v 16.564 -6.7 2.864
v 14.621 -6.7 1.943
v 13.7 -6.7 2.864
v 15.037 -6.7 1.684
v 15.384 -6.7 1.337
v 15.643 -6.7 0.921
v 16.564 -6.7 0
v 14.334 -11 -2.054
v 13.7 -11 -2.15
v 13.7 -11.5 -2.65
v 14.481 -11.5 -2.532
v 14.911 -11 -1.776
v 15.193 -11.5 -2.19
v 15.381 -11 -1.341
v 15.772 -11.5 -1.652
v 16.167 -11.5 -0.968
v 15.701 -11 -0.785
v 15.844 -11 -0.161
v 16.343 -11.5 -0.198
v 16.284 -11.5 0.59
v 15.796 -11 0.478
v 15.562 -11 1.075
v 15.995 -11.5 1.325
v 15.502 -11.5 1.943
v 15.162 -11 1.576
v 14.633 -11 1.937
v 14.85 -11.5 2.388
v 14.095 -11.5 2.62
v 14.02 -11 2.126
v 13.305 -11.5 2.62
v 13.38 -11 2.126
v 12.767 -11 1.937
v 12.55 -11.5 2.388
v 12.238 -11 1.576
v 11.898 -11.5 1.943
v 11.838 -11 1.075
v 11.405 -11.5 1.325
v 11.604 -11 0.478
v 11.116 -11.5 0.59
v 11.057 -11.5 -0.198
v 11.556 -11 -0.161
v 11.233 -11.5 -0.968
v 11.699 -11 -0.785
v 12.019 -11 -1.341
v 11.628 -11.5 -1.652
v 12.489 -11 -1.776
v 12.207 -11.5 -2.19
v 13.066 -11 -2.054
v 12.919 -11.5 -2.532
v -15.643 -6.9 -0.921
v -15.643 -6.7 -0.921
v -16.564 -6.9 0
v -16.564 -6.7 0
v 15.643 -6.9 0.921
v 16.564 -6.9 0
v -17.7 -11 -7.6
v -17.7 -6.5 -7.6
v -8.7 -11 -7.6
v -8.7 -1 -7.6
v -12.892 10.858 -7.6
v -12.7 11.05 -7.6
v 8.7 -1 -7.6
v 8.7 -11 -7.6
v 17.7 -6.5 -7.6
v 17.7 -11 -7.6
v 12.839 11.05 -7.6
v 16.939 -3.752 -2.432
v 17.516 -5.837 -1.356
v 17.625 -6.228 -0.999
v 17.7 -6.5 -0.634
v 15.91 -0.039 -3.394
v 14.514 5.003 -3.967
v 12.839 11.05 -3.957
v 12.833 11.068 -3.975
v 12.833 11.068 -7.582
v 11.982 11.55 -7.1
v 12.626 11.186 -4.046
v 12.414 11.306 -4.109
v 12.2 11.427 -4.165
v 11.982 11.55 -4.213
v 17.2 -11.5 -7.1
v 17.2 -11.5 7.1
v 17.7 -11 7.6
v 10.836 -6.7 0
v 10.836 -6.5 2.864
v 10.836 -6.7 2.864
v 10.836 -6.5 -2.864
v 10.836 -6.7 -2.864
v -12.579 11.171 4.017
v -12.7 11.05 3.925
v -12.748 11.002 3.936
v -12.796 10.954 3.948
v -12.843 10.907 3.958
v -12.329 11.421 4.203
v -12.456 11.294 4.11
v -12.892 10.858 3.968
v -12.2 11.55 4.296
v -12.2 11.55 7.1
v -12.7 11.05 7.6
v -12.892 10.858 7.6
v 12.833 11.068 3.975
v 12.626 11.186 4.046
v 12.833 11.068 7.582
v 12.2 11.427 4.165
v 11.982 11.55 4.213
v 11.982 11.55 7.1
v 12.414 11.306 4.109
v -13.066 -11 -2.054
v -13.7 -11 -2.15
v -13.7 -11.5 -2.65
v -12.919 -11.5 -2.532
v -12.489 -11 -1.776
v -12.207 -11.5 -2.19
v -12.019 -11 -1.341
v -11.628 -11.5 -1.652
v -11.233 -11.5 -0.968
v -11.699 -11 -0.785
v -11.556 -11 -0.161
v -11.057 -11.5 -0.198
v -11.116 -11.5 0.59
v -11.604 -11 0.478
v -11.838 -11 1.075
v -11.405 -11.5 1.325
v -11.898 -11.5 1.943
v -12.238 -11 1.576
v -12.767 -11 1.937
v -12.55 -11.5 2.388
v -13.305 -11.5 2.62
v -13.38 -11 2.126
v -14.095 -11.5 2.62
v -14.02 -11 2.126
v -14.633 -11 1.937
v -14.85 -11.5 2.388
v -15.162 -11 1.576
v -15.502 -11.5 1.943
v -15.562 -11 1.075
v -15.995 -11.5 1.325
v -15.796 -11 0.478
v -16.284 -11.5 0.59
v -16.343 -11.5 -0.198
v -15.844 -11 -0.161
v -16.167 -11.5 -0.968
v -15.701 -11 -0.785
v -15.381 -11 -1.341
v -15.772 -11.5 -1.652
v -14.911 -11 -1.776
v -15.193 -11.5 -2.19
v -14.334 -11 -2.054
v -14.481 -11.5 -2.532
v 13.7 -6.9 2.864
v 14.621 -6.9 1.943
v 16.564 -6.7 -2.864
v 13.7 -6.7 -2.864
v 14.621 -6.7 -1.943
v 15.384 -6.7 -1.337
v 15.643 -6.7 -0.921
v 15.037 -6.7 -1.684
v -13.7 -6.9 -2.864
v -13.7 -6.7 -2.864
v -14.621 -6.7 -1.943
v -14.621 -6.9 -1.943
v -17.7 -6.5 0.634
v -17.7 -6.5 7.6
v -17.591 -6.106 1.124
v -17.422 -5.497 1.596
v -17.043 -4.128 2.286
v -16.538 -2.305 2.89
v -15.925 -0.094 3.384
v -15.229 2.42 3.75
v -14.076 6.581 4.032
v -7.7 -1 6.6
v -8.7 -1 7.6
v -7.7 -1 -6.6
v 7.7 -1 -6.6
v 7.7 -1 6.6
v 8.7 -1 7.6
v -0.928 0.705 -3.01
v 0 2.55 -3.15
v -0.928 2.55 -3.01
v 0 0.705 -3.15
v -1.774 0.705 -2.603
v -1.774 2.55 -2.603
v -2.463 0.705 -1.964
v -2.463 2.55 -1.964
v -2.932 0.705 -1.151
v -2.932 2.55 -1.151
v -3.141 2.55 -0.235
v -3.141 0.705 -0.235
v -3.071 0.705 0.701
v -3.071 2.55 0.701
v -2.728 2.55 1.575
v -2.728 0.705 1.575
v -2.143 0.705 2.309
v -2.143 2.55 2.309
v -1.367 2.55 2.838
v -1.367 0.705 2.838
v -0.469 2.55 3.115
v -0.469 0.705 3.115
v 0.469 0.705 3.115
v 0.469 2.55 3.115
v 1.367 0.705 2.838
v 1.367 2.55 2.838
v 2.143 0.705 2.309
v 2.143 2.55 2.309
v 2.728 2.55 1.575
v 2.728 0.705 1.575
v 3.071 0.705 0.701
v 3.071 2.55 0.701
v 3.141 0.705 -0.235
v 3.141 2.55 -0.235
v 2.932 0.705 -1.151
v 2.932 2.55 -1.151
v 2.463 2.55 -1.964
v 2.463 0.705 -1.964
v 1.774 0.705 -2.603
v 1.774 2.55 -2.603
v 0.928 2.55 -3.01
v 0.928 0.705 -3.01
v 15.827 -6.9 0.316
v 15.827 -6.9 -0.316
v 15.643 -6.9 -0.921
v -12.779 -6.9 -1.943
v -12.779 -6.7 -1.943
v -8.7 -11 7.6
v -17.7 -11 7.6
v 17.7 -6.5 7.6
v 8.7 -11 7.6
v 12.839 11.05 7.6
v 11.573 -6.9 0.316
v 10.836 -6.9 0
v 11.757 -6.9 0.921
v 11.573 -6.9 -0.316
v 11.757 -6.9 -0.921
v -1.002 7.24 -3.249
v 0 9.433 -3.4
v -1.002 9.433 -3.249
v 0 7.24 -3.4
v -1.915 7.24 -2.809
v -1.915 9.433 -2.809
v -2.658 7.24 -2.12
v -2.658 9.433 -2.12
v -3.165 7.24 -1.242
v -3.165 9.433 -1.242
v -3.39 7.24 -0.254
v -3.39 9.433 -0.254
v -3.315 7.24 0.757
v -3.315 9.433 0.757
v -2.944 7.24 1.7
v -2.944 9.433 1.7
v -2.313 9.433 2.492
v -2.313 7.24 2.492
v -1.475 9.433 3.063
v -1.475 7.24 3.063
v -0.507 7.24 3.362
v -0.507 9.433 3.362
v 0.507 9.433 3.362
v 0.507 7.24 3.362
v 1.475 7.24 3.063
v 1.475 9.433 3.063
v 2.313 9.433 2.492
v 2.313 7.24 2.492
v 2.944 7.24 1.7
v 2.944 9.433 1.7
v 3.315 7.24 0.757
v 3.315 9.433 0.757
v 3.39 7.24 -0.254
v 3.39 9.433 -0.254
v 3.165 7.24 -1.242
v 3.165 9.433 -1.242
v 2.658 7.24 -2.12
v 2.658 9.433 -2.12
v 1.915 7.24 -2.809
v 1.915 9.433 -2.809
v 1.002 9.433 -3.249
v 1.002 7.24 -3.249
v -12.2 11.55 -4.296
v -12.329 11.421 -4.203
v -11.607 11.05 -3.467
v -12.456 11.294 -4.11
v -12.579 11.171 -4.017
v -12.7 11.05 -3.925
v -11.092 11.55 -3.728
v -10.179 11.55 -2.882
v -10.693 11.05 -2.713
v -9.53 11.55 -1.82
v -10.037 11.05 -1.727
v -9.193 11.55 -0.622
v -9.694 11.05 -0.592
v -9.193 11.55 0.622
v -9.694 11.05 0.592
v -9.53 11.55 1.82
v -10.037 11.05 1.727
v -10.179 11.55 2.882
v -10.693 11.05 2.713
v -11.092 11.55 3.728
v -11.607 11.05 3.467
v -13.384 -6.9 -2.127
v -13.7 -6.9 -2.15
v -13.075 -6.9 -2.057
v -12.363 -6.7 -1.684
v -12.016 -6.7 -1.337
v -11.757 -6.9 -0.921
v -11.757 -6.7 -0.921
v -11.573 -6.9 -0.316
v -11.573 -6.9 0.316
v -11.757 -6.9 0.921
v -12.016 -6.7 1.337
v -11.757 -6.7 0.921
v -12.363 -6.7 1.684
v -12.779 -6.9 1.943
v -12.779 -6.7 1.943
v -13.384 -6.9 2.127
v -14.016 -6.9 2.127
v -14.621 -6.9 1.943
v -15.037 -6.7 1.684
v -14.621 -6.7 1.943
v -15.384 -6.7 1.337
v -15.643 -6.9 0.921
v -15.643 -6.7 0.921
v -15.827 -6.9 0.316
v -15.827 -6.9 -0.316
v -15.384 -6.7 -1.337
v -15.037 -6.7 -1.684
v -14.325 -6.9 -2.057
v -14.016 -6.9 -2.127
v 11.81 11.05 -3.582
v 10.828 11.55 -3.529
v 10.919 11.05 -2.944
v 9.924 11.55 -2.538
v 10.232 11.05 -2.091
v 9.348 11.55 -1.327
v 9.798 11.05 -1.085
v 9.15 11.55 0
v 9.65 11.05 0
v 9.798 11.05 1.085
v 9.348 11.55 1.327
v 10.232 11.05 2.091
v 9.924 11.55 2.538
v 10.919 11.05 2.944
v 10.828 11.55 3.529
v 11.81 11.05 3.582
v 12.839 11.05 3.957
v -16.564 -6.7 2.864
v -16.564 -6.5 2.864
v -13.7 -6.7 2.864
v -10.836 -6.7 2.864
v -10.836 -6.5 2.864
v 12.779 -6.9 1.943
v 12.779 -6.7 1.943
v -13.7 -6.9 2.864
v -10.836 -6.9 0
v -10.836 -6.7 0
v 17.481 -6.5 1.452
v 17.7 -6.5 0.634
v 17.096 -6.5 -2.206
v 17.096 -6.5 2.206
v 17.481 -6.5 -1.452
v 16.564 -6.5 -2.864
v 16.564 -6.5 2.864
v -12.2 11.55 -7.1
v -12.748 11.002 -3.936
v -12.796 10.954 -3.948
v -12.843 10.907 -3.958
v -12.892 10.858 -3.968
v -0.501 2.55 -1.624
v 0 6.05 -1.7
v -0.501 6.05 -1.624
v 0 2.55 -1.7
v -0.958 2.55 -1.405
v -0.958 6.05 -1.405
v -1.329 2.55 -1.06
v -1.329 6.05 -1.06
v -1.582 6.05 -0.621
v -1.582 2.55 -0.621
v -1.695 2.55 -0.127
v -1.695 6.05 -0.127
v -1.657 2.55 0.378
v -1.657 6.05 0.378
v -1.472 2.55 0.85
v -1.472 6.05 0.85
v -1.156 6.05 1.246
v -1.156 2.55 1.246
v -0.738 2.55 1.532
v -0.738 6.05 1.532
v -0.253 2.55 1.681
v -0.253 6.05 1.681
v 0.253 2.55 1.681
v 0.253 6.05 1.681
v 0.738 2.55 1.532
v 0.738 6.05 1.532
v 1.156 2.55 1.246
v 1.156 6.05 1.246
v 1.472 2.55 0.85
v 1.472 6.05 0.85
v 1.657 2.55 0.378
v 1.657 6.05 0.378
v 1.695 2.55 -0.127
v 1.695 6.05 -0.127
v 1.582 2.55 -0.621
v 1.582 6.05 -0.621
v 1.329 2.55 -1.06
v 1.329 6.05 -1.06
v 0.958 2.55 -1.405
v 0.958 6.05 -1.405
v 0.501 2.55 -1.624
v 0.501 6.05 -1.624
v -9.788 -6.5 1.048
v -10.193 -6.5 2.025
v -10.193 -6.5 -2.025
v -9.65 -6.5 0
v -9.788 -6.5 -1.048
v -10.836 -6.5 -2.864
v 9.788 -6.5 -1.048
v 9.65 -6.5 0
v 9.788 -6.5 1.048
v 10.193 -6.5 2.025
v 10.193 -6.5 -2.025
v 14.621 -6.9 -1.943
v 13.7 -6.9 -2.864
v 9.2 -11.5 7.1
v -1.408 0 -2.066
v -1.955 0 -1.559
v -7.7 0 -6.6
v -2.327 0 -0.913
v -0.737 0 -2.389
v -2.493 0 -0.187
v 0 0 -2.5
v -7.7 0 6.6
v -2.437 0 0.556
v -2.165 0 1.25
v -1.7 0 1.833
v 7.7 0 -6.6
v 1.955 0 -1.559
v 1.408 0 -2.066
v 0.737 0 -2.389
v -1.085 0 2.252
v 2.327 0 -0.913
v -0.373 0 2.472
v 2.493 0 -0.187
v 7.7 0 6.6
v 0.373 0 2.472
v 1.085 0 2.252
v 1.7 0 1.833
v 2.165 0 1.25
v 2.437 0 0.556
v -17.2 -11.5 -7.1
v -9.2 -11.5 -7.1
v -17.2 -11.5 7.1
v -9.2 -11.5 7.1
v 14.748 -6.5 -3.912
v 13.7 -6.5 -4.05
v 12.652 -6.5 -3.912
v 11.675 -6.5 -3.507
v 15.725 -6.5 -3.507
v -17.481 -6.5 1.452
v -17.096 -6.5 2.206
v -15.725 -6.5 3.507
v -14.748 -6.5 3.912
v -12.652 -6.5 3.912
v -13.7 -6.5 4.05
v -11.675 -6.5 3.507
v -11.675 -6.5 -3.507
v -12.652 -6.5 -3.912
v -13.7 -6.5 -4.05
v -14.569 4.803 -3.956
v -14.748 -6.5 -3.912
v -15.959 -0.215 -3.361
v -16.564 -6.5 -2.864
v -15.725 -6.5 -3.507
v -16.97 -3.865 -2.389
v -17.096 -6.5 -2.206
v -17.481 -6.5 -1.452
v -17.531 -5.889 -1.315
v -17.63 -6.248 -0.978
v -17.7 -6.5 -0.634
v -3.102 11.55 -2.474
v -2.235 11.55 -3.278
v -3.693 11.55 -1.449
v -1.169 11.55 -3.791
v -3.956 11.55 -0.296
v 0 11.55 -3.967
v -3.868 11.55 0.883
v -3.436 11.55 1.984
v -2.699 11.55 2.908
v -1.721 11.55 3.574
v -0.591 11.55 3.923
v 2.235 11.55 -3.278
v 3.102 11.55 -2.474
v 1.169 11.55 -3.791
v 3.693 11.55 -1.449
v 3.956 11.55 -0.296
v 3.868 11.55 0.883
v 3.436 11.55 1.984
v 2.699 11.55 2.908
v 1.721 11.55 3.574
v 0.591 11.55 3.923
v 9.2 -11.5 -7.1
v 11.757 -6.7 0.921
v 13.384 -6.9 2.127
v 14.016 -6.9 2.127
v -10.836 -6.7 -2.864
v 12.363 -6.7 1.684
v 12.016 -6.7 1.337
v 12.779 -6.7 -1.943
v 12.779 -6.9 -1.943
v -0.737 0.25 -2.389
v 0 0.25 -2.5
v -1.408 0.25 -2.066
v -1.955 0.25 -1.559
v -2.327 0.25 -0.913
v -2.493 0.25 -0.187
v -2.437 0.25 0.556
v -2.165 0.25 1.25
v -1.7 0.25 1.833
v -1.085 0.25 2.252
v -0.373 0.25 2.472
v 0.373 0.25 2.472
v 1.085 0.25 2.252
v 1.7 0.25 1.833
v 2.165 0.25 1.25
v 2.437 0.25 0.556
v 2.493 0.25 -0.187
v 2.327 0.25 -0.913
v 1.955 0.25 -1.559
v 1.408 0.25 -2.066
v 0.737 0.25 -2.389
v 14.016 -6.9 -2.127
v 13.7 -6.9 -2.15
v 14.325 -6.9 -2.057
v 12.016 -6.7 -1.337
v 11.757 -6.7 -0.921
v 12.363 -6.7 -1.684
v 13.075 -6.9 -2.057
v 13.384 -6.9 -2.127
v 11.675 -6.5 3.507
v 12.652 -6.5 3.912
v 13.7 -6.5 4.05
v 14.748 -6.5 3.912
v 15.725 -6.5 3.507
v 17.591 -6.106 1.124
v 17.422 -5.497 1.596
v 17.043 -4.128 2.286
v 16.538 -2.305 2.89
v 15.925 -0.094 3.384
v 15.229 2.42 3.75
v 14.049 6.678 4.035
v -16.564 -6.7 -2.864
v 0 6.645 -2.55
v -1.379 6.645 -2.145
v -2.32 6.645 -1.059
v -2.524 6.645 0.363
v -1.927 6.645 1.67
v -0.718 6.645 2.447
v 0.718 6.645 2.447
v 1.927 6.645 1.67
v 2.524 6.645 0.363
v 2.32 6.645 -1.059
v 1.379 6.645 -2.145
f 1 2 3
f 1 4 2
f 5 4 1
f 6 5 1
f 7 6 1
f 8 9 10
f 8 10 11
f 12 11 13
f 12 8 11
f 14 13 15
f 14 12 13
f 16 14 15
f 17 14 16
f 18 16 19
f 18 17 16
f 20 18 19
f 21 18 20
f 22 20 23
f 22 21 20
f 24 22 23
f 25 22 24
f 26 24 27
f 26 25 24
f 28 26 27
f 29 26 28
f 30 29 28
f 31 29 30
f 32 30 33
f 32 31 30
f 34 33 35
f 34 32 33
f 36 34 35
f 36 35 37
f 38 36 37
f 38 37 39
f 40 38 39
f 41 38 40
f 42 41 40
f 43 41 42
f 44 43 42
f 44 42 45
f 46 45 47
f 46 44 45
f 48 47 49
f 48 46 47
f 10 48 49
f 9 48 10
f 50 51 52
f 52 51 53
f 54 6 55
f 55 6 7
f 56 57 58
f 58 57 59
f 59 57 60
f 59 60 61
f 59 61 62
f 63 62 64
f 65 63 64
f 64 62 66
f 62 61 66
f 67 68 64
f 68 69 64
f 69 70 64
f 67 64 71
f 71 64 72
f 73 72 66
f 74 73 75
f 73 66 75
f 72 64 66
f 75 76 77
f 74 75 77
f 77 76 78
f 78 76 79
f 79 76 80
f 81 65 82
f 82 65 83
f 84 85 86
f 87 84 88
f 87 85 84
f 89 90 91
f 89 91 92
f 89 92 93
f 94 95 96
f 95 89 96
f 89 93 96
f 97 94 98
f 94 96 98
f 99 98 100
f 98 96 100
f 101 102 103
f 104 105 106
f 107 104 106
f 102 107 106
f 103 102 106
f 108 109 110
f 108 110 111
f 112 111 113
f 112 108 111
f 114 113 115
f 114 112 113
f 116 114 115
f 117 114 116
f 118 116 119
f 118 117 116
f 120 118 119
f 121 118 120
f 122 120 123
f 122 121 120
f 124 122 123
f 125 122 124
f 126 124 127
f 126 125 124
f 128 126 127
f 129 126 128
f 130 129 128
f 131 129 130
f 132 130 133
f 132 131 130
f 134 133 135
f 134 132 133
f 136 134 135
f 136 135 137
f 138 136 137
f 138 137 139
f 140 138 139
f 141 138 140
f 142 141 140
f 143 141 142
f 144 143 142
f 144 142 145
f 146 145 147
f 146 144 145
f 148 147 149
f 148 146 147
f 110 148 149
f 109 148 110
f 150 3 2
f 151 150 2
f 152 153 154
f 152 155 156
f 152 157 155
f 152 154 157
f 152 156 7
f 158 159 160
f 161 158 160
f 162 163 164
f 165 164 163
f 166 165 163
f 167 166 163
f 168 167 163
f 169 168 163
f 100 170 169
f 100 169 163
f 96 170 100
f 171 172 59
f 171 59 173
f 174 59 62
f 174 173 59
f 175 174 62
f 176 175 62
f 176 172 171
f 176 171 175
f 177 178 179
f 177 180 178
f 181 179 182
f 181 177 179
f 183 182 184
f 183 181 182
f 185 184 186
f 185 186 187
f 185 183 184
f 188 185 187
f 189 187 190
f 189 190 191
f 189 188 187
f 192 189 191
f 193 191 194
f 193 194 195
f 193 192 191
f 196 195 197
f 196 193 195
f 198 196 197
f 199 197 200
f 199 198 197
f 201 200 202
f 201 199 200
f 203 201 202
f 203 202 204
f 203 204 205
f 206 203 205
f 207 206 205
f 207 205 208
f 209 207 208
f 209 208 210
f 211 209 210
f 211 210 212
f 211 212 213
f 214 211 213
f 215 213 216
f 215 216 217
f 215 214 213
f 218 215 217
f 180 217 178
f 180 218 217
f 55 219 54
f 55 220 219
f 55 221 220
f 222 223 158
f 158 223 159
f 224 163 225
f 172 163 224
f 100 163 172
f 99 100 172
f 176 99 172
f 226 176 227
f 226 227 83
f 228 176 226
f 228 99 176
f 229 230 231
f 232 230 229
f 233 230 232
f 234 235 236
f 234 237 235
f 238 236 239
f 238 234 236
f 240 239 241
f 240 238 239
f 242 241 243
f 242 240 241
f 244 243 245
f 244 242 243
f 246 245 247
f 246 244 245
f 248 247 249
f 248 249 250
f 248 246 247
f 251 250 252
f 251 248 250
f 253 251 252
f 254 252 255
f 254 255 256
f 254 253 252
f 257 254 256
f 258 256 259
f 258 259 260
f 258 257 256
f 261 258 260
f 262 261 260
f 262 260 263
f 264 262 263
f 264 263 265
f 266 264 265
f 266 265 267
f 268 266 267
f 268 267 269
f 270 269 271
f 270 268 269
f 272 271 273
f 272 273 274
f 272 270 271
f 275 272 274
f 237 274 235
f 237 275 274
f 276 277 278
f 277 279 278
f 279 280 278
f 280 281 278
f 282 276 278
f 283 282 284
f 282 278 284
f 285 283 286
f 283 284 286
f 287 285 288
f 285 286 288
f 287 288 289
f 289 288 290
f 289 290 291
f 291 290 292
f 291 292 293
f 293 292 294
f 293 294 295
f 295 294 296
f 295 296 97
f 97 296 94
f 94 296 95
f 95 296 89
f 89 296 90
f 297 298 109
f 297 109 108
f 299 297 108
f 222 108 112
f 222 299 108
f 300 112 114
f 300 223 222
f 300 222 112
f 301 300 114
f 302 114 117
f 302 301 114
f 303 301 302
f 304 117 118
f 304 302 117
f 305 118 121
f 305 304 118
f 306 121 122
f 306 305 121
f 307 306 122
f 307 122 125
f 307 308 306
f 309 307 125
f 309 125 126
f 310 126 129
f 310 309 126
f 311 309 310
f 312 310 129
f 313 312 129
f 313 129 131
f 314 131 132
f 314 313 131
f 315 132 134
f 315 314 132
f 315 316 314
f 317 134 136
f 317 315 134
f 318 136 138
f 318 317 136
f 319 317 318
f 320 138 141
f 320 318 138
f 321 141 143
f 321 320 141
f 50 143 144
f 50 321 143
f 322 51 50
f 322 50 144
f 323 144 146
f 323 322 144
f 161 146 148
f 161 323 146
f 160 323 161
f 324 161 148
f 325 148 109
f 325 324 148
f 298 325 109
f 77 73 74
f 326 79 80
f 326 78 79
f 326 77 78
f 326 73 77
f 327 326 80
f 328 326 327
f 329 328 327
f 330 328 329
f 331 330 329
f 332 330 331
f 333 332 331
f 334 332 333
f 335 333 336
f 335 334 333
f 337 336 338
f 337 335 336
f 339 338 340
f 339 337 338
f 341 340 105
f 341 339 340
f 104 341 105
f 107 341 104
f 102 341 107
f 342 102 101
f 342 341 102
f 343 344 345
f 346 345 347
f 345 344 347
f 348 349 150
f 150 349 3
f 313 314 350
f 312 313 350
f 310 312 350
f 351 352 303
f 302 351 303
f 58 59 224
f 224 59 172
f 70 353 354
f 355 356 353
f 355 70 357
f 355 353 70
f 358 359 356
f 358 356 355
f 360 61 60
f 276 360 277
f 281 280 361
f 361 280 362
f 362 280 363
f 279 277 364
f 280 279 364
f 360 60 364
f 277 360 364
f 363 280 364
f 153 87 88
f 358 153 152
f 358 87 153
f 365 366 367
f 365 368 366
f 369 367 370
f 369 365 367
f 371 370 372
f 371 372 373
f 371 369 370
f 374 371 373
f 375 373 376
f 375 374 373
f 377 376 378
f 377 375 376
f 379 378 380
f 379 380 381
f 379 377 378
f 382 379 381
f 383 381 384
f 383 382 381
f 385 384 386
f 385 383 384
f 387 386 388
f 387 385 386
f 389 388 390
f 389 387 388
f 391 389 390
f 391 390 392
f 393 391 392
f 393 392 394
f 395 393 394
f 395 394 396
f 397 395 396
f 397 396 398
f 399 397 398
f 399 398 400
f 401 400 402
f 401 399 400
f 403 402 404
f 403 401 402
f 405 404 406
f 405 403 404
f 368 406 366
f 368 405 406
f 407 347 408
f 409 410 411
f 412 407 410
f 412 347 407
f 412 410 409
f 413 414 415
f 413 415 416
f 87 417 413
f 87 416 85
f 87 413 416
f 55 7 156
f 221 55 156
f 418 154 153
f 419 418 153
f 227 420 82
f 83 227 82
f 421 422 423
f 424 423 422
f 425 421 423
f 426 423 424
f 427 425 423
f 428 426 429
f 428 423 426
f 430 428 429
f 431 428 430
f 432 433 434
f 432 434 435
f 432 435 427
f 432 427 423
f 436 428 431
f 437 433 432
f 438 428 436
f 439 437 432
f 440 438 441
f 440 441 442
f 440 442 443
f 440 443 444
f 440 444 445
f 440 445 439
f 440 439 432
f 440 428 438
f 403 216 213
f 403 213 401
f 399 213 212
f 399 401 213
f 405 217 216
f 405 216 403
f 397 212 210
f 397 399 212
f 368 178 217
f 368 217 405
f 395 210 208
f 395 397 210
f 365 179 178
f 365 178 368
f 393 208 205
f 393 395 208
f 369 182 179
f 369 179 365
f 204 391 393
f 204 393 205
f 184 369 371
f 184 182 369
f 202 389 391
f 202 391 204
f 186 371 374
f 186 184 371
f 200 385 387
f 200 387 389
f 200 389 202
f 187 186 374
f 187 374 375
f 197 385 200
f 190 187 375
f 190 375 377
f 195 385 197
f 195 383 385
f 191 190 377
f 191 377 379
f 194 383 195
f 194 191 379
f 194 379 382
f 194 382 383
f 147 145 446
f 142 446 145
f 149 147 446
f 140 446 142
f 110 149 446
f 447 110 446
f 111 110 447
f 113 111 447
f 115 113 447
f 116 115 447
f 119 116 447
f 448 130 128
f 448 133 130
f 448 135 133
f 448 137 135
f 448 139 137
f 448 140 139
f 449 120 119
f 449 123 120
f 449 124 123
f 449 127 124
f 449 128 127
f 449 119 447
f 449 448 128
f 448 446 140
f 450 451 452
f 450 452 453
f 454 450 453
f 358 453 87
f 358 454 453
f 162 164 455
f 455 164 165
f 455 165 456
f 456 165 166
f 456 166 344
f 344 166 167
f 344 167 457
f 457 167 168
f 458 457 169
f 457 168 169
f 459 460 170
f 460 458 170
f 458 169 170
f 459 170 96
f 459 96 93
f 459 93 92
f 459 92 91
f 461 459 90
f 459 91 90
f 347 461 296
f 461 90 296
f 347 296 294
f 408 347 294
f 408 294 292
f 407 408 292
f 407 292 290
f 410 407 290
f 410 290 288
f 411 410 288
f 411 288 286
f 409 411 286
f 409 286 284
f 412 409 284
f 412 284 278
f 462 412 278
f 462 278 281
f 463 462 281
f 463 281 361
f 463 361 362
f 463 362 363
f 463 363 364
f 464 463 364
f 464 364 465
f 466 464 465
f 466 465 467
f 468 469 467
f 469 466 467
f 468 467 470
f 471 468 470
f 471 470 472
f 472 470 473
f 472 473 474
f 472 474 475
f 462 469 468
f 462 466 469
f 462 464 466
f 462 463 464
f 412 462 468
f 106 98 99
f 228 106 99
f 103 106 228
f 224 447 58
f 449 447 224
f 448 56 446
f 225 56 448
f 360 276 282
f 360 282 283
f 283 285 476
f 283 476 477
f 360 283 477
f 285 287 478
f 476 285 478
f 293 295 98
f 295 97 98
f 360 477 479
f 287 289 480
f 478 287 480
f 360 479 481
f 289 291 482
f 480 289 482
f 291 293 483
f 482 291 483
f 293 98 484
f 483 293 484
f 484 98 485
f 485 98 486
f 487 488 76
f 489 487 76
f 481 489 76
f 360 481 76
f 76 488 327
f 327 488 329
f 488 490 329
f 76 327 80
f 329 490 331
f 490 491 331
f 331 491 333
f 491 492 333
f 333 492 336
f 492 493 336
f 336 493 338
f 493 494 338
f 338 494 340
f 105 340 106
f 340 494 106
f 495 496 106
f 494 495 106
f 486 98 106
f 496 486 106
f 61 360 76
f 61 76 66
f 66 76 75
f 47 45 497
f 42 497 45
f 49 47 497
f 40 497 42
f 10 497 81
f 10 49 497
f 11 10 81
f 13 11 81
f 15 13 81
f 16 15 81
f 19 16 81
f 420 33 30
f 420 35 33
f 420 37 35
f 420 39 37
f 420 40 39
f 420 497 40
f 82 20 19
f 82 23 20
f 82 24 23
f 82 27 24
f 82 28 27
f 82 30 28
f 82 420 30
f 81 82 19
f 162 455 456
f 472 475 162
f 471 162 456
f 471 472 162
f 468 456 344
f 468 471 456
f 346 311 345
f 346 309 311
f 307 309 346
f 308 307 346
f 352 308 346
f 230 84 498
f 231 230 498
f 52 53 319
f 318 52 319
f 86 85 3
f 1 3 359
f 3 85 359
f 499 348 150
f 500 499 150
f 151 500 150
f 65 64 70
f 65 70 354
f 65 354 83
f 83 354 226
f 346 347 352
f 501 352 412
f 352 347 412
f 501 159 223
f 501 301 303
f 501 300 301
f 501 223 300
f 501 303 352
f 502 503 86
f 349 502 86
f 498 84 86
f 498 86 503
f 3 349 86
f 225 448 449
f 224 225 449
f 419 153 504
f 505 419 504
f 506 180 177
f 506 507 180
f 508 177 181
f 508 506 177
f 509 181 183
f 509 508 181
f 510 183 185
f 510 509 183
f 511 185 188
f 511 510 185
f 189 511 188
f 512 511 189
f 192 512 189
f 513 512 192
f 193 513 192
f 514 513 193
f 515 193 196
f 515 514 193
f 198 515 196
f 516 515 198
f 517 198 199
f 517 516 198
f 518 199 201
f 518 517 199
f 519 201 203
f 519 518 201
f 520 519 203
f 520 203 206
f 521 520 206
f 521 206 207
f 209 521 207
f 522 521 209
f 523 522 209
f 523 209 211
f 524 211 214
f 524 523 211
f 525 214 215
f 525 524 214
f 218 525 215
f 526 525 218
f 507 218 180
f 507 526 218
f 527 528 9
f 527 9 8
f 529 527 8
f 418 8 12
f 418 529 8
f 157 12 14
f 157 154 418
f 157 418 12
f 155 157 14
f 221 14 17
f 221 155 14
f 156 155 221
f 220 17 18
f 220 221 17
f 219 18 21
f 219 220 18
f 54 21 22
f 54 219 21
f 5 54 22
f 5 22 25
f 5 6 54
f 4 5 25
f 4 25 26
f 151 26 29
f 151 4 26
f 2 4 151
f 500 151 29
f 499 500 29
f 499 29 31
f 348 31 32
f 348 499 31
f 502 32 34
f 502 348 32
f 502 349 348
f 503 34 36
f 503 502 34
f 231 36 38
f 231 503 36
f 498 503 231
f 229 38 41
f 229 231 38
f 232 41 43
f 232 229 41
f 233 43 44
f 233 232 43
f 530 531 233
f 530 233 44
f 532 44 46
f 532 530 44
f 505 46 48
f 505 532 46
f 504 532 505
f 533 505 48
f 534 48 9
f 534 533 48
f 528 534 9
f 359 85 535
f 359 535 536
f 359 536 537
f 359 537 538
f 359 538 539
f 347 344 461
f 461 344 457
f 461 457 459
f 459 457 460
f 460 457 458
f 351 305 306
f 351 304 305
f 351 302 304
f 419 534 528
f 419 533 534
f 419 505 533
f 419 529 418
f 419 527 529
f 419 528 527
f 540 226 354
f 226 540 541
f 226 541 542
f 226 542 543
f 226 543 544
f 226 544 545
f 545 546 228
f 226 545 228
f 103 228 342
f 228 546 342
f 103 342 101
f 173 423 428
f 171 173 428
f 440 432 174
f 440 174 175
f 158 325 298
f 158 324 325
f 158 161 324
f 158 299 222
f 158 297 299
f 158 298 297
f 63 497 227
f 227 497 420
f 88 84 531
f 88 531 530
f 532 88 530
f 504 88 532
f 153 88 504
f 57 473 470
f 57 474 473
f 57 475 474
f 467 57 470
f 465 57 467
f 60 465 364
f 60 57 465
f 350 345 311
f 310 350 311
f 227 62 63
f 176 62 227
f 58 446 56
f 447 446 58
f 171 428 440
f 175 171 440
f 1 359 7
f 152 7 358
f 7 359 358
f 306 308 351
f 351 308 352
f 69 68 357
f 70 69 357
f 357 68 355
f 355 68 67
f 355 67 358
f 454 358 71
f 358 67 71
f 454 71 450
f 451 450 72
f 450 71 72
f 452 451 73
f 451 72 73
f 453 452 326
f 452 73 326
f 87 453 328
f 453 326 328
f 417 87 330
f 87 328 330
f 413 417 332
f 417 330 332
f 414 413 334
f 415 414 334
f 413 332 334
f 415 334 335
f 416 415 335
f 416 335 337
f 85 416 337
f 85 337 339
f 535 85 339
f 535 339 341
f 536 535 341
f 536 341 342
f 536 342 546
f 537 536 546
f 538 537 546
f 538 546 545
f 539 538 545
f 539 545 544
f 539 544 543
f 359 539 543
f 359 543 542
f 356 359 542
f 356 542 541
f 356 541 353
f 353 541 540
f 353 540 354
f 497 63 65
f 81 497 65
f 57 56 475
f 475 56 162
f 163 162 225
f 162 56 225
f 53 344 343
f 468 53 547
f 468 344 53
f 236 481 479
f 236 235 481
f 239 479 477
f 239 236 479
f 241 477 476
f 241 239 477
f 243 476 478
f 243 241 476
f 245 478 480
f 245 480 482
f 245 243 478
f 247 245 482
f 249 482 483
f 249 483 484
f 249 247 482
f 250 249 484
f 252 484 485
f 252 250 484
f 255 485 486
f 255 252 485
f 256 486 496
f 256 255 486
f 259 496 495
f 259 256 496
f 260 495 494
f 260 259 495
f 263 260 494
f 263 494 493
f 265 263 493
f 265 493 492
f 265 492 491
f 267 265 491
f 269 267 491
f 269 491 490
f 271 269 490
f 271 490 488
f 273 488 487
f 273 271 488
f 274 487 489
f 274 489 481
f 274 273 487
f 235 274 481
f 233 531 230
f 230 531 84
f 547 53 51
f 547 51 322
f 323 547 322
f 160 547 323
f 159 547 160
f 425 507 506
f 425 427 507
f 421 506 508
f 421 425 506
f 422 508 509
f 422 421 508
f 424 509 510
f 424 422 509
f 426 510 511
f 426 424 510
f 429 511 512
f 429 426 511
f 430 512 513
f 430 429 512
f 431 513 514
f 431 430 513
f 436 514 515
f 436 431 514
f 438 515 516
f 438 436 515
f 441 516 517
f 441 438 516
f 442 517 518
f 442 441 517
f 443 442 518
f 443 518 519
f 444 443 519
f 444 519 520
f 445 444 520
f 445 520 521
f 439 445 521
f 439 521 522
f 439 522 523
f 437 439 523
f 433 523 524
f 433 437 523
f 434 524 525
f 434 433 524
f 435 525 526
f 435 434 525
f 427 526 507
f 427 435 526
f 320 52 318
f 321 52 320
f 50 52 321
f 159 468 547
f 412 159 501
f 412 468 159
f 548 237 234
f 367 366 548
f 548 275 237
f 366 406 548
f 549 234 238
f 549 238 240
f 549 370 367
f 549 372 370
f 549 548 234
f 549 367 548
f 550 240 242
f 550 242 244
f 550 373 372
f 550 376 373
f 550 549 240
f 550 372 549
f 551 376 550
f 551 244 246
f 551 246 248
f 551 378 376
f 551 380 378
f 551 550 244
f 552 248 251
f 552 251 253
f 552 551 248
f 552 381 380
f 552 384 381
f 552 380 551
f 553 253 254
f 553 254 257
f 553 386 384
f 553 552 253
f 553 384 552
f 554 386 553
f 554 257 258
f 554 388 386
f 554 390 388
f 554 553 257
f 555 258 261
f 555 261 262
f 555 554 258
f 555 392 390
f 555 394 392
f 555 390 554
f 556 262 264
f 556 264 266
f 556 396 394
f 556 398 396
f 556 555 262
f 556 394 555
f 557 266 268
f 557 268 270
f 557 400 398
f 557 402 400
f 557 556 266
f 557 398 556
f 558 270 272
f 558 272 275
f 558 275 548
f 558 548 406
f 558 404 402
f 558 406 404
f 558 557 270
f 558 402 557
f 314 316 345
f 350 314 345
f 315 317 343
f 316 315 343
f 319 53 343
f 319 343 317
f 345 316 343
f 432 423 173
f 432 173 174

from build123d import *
from OCP.BRepFilletAPI import BRepFilletAPI_MakeChamfer

# Parameters (mm, degrees)
SKETCH3_W           = 35.4
SKETCH3_H           = 15.2
SKETCH3_R           = 2.15
SKETCH3_R_2         = 6.5
BOSS_EXTRUDE1_DEPTH = 11.55
SKETCH4_W           = 17.4
SKETCH4_H           = 15.2
SKETCH4_W_2         = 15.4
SKETCH4_H_2         = 13.2
BOSS_EXTRUDE2_DEPTH = 1
SKETCH5_W           = 9
SKETCH5_H           = 15.2
SKETCH5_R           = 2.15
BOSS_EXTRUDE3_DEPTH = 11.5
SKETCH6_R           = 4.05
CUT_EXTRUDE1_DEPTH  = 18.05
CUT_EXTRUDE4_DEPTH  = 27.033295988
CHAMFER1_SIZE       = 0.5
CHAMFER1_SIZE2      = 0.717613884
SKETCH10_W          = 5.727564928
SKETCH10_H          = 5.727564928
CUT_EXTRUDE5_DEPTH  = 0.2
CUT_EXTRUDE6_DEPTH  = 0.2


with BuildPart() as part:
    # Sketch1 → Revolve1 (revolve)
    with BuildSketch(Plane.XY, mode=Mode.PRIVATE) as revolve1_sk:
        Polygon((3.15, 0.7051349), (2.5, 0.25), (2.5, 0), (6.5, 0), (6.5, 11.55), (3.967375816, 11.55), (3.4, 9.432524629), (3.4, 7.240352815), (1.7, 6.05), (1.7, 2.55), (3.15, 2.55), align=None)
    revolve(revolve1_sk.sketch.rotate(Axis((0, 0, 0), (0, 1, 0)), 90), axis=Axis((0, 0, 0), (0, 1, 0)))

    # Sketch3 → Boss-Extrude1 (add)
    with BuildSketch(Plane.XZ):
        Rectangle(SKETCH3_W, SKETCH3_H)
        with Locations(Location((13.7, 0, 0), (0, 0, 270))):
            Circle(SKETCH3_R, mode=Mode.SUBTRACT)
        with Locations(Location((-13.7, 0, 0), (0, 0, 270))):
            Circle(SKETCH3_R, mode=Mode.SUBTRACT)
        Circle(SKETCH3_R_2, mode=Mode.SUBTRACT)
    extrude(amount=-BOSS_EXTRUDE1_DEPTH)

    # Sketch4 → Boss-Extrude2 (add)
    with BuildSketch(Plane.XZ):
        Rectangle(SKETCH4_W, SKETCH4_H)
        Rectangle(SKETCH4_W_2, SKETCH4_H_2, mode=Mode.SUBTRACT)
    extrude(amount=BOSS_EXTRUDE2_DEPTH)

    # Sketch5 → Boss-Extrude3 (add)
    with BuildSketch(Plane.XZ):
        with Locations((13.2, 0)):
            Rectangle(SKETCH5_W, SKETCH5_H)
        with Locations(Location((13.7, 0, 0), (0, 0, 270))):
            Circle(SKETCH5_R, mode=Mode.SUBTRACT)
        with Locations((-13.2, 0)):
            Rectangle(SKETCH5_W, SKETCH5_H)
        with Locations(Location((-13.7, 0, 0), (0, 0, 270))):
            Circle(SKETCH5_R, mode=Mode.SUBTRACT)
    extrude(amount=BOSS_EXTRUDE3_DEPTH)

    # Sketch6 → Cut-Extrude1 (cut)
    with BuildSketch(Plane(origin=(0, 11.55, 0), x_dir=(1, 0, 0), z_dir=(0, 1, 0))):
        with Locations((-13.7, 0)):
            Circle(SKETCH6_R)
        with Locations((13.7, 0)):
            Circle(SKETCH6_R)
    extrude(amount=-CUT_EXTRUDE1_DEPTH, mode=Mode.SUBTRACT)

    # Sketch8 → Cut-Extrude4 (cut, through all)
    with BuildSketch(Plane(origin=(0, 0, -7.6), x_dir=(-1, 0, 0), z_dir=(0, 0, -1))):
        Polygon((-17.7, -6.5), (-12.7, 11.55), (-17.7, 11.55), align=None)
        Polygon((17.7, 11.55), (17.7, -6.5), (12.7, 11.55), align=None)
    extrude(amount=-CUT_EXTRUDE4_DEPTH, mode=Mode.SUBTRACT)

    # Chamfer1: one chamfer whose edges measure the first distance from different faces: ONE call of the kernel's chamfer builder (chamfer() names one face for all edges)
    chamfer1_edges_1 = [part.edges().sort_by_distance(p)[0] for p in [
        (13.7, -11.5, 2.15),
        (17.7, -11.5, 0),
        (13.2, -11.5, -7.6),
        (8.7, -11.5, 0),
        (13.2, -11.5, 7.6),
        (-13.7, -11.5, 2.15),
        (-17.7, -11.5, 0),
        (-13.2, -11.5, 7.6),
        (-8.7, -11.5, 0),
        (-13.2, -11.5, -7.6),
        (-9.65, 11.55, 0),
        (0, 11.55, -7.6),
        (9.65, 11.55, 0),
        (0, 11.55, 7.6),
    ]]
    chamfer1_edges_2 = [part.edges().sort_by_distance(p)[0] for p in [
        (-12.7, 11.55, 5.762300945),
        (-12.7, 11.55, -5.762300945),
    ]]
    chamfer1_side_2 = [part.faces().sort_by_distance(p)[0] for p in [
        (-9.353993243, 11.55, 0),
    ]]
    chamfer1_edges_3 = [part.edges().sort_by_distance(p)[0] for p in [
        (12.7, 11.55, -5.762300945),
    ]]
    chamfer1_side_3 = [part.faces().sort_by_distance(p)[0] for p in [
        (15.4479971, 1.629730468, -5.405864047),
    ]]
    chamfer1_edges_4 = [part.edges().sort_by_distance(p)[0] for p in [
        (12.7, 11.55, 5.762300945),
    ]]
    chamfer1_side_4 = [part.faces().sort_by_distance(p)[0] for p in [
        (15.4479971, 1.629730468, 5.405864047),
    ]]
    chamfer1 = BRepFilletAPI_MakeChamfer(part.part.solid().wrapped)
    for e in chamfer1_edges_1:
        chamfer1.Add(CHAMFER1_SIZE, e.wrapped)
    for e in chamfer1_edges_2:
        chamfer1.Add(CHAMFER1_SIZE, CHAMFER1_SIZE2, e.wrapped, chamfer1_side_2[0].wrapped)  # the first distance lies on this face
    for e in chamfer1_edges_3:
        chamfer1.Add(CHAMFER1_SIZE, CHAMFER1_SIZE2, e.wrapped, chamfer1_side_3[0].wrapped)  # the first distance lies on this face
    for e in chamfer1_edges_4:
        chamfer1.Add(CHAMFER1_SIZE, CHAMFER1_SIZE2, e.wrapped, chamfer1_side_4[0].wrapped)  # the first distance lies on this face
    add(Compound.cast(chamfer1.Shape()), mode=Mode.REPLACE)

    # Sketch10 → Cut-Extrude5 (cut)
    with BuildSketch(Plane(origin=(0, -6.5, 0), x_dir=(1, 0, 0), z_dir=(0, 1, 0))):
        with Locations((-13.7, 0)):
            Rectangle(SKETCH10_W, SKETCH10_H)
        with Locations((13.7, 0)):
            Rectangle(SKETCH10_W, SKETCH10_H)
    extrude(amount=-CUT_EXTRUDE5_DEPTH, mode=Mode.SUBTRACT)

    # Sketch11 → Cut-Extrude6 (cut)
    with BuildSketch(Plane(origin=(0, -6.7, 0), x_dir=(1, 0, 0), z_dir=(0, 1, 0))):
        Polygon((-16.563782464, 0), (-13.7, -2.863782464), (-10.836217536, 0), (-13.7, 2.863782464), align=None)
        Polygon((13.7, 2.863782464), (10.836217536, 0), (13.7, -2.863782464), (16.563782464, 0), align=None)
    extrude(amount=-CUT_EXTRUDE6_DEPTH, mode=Mode.SUBTRACT)


solid = part.part
